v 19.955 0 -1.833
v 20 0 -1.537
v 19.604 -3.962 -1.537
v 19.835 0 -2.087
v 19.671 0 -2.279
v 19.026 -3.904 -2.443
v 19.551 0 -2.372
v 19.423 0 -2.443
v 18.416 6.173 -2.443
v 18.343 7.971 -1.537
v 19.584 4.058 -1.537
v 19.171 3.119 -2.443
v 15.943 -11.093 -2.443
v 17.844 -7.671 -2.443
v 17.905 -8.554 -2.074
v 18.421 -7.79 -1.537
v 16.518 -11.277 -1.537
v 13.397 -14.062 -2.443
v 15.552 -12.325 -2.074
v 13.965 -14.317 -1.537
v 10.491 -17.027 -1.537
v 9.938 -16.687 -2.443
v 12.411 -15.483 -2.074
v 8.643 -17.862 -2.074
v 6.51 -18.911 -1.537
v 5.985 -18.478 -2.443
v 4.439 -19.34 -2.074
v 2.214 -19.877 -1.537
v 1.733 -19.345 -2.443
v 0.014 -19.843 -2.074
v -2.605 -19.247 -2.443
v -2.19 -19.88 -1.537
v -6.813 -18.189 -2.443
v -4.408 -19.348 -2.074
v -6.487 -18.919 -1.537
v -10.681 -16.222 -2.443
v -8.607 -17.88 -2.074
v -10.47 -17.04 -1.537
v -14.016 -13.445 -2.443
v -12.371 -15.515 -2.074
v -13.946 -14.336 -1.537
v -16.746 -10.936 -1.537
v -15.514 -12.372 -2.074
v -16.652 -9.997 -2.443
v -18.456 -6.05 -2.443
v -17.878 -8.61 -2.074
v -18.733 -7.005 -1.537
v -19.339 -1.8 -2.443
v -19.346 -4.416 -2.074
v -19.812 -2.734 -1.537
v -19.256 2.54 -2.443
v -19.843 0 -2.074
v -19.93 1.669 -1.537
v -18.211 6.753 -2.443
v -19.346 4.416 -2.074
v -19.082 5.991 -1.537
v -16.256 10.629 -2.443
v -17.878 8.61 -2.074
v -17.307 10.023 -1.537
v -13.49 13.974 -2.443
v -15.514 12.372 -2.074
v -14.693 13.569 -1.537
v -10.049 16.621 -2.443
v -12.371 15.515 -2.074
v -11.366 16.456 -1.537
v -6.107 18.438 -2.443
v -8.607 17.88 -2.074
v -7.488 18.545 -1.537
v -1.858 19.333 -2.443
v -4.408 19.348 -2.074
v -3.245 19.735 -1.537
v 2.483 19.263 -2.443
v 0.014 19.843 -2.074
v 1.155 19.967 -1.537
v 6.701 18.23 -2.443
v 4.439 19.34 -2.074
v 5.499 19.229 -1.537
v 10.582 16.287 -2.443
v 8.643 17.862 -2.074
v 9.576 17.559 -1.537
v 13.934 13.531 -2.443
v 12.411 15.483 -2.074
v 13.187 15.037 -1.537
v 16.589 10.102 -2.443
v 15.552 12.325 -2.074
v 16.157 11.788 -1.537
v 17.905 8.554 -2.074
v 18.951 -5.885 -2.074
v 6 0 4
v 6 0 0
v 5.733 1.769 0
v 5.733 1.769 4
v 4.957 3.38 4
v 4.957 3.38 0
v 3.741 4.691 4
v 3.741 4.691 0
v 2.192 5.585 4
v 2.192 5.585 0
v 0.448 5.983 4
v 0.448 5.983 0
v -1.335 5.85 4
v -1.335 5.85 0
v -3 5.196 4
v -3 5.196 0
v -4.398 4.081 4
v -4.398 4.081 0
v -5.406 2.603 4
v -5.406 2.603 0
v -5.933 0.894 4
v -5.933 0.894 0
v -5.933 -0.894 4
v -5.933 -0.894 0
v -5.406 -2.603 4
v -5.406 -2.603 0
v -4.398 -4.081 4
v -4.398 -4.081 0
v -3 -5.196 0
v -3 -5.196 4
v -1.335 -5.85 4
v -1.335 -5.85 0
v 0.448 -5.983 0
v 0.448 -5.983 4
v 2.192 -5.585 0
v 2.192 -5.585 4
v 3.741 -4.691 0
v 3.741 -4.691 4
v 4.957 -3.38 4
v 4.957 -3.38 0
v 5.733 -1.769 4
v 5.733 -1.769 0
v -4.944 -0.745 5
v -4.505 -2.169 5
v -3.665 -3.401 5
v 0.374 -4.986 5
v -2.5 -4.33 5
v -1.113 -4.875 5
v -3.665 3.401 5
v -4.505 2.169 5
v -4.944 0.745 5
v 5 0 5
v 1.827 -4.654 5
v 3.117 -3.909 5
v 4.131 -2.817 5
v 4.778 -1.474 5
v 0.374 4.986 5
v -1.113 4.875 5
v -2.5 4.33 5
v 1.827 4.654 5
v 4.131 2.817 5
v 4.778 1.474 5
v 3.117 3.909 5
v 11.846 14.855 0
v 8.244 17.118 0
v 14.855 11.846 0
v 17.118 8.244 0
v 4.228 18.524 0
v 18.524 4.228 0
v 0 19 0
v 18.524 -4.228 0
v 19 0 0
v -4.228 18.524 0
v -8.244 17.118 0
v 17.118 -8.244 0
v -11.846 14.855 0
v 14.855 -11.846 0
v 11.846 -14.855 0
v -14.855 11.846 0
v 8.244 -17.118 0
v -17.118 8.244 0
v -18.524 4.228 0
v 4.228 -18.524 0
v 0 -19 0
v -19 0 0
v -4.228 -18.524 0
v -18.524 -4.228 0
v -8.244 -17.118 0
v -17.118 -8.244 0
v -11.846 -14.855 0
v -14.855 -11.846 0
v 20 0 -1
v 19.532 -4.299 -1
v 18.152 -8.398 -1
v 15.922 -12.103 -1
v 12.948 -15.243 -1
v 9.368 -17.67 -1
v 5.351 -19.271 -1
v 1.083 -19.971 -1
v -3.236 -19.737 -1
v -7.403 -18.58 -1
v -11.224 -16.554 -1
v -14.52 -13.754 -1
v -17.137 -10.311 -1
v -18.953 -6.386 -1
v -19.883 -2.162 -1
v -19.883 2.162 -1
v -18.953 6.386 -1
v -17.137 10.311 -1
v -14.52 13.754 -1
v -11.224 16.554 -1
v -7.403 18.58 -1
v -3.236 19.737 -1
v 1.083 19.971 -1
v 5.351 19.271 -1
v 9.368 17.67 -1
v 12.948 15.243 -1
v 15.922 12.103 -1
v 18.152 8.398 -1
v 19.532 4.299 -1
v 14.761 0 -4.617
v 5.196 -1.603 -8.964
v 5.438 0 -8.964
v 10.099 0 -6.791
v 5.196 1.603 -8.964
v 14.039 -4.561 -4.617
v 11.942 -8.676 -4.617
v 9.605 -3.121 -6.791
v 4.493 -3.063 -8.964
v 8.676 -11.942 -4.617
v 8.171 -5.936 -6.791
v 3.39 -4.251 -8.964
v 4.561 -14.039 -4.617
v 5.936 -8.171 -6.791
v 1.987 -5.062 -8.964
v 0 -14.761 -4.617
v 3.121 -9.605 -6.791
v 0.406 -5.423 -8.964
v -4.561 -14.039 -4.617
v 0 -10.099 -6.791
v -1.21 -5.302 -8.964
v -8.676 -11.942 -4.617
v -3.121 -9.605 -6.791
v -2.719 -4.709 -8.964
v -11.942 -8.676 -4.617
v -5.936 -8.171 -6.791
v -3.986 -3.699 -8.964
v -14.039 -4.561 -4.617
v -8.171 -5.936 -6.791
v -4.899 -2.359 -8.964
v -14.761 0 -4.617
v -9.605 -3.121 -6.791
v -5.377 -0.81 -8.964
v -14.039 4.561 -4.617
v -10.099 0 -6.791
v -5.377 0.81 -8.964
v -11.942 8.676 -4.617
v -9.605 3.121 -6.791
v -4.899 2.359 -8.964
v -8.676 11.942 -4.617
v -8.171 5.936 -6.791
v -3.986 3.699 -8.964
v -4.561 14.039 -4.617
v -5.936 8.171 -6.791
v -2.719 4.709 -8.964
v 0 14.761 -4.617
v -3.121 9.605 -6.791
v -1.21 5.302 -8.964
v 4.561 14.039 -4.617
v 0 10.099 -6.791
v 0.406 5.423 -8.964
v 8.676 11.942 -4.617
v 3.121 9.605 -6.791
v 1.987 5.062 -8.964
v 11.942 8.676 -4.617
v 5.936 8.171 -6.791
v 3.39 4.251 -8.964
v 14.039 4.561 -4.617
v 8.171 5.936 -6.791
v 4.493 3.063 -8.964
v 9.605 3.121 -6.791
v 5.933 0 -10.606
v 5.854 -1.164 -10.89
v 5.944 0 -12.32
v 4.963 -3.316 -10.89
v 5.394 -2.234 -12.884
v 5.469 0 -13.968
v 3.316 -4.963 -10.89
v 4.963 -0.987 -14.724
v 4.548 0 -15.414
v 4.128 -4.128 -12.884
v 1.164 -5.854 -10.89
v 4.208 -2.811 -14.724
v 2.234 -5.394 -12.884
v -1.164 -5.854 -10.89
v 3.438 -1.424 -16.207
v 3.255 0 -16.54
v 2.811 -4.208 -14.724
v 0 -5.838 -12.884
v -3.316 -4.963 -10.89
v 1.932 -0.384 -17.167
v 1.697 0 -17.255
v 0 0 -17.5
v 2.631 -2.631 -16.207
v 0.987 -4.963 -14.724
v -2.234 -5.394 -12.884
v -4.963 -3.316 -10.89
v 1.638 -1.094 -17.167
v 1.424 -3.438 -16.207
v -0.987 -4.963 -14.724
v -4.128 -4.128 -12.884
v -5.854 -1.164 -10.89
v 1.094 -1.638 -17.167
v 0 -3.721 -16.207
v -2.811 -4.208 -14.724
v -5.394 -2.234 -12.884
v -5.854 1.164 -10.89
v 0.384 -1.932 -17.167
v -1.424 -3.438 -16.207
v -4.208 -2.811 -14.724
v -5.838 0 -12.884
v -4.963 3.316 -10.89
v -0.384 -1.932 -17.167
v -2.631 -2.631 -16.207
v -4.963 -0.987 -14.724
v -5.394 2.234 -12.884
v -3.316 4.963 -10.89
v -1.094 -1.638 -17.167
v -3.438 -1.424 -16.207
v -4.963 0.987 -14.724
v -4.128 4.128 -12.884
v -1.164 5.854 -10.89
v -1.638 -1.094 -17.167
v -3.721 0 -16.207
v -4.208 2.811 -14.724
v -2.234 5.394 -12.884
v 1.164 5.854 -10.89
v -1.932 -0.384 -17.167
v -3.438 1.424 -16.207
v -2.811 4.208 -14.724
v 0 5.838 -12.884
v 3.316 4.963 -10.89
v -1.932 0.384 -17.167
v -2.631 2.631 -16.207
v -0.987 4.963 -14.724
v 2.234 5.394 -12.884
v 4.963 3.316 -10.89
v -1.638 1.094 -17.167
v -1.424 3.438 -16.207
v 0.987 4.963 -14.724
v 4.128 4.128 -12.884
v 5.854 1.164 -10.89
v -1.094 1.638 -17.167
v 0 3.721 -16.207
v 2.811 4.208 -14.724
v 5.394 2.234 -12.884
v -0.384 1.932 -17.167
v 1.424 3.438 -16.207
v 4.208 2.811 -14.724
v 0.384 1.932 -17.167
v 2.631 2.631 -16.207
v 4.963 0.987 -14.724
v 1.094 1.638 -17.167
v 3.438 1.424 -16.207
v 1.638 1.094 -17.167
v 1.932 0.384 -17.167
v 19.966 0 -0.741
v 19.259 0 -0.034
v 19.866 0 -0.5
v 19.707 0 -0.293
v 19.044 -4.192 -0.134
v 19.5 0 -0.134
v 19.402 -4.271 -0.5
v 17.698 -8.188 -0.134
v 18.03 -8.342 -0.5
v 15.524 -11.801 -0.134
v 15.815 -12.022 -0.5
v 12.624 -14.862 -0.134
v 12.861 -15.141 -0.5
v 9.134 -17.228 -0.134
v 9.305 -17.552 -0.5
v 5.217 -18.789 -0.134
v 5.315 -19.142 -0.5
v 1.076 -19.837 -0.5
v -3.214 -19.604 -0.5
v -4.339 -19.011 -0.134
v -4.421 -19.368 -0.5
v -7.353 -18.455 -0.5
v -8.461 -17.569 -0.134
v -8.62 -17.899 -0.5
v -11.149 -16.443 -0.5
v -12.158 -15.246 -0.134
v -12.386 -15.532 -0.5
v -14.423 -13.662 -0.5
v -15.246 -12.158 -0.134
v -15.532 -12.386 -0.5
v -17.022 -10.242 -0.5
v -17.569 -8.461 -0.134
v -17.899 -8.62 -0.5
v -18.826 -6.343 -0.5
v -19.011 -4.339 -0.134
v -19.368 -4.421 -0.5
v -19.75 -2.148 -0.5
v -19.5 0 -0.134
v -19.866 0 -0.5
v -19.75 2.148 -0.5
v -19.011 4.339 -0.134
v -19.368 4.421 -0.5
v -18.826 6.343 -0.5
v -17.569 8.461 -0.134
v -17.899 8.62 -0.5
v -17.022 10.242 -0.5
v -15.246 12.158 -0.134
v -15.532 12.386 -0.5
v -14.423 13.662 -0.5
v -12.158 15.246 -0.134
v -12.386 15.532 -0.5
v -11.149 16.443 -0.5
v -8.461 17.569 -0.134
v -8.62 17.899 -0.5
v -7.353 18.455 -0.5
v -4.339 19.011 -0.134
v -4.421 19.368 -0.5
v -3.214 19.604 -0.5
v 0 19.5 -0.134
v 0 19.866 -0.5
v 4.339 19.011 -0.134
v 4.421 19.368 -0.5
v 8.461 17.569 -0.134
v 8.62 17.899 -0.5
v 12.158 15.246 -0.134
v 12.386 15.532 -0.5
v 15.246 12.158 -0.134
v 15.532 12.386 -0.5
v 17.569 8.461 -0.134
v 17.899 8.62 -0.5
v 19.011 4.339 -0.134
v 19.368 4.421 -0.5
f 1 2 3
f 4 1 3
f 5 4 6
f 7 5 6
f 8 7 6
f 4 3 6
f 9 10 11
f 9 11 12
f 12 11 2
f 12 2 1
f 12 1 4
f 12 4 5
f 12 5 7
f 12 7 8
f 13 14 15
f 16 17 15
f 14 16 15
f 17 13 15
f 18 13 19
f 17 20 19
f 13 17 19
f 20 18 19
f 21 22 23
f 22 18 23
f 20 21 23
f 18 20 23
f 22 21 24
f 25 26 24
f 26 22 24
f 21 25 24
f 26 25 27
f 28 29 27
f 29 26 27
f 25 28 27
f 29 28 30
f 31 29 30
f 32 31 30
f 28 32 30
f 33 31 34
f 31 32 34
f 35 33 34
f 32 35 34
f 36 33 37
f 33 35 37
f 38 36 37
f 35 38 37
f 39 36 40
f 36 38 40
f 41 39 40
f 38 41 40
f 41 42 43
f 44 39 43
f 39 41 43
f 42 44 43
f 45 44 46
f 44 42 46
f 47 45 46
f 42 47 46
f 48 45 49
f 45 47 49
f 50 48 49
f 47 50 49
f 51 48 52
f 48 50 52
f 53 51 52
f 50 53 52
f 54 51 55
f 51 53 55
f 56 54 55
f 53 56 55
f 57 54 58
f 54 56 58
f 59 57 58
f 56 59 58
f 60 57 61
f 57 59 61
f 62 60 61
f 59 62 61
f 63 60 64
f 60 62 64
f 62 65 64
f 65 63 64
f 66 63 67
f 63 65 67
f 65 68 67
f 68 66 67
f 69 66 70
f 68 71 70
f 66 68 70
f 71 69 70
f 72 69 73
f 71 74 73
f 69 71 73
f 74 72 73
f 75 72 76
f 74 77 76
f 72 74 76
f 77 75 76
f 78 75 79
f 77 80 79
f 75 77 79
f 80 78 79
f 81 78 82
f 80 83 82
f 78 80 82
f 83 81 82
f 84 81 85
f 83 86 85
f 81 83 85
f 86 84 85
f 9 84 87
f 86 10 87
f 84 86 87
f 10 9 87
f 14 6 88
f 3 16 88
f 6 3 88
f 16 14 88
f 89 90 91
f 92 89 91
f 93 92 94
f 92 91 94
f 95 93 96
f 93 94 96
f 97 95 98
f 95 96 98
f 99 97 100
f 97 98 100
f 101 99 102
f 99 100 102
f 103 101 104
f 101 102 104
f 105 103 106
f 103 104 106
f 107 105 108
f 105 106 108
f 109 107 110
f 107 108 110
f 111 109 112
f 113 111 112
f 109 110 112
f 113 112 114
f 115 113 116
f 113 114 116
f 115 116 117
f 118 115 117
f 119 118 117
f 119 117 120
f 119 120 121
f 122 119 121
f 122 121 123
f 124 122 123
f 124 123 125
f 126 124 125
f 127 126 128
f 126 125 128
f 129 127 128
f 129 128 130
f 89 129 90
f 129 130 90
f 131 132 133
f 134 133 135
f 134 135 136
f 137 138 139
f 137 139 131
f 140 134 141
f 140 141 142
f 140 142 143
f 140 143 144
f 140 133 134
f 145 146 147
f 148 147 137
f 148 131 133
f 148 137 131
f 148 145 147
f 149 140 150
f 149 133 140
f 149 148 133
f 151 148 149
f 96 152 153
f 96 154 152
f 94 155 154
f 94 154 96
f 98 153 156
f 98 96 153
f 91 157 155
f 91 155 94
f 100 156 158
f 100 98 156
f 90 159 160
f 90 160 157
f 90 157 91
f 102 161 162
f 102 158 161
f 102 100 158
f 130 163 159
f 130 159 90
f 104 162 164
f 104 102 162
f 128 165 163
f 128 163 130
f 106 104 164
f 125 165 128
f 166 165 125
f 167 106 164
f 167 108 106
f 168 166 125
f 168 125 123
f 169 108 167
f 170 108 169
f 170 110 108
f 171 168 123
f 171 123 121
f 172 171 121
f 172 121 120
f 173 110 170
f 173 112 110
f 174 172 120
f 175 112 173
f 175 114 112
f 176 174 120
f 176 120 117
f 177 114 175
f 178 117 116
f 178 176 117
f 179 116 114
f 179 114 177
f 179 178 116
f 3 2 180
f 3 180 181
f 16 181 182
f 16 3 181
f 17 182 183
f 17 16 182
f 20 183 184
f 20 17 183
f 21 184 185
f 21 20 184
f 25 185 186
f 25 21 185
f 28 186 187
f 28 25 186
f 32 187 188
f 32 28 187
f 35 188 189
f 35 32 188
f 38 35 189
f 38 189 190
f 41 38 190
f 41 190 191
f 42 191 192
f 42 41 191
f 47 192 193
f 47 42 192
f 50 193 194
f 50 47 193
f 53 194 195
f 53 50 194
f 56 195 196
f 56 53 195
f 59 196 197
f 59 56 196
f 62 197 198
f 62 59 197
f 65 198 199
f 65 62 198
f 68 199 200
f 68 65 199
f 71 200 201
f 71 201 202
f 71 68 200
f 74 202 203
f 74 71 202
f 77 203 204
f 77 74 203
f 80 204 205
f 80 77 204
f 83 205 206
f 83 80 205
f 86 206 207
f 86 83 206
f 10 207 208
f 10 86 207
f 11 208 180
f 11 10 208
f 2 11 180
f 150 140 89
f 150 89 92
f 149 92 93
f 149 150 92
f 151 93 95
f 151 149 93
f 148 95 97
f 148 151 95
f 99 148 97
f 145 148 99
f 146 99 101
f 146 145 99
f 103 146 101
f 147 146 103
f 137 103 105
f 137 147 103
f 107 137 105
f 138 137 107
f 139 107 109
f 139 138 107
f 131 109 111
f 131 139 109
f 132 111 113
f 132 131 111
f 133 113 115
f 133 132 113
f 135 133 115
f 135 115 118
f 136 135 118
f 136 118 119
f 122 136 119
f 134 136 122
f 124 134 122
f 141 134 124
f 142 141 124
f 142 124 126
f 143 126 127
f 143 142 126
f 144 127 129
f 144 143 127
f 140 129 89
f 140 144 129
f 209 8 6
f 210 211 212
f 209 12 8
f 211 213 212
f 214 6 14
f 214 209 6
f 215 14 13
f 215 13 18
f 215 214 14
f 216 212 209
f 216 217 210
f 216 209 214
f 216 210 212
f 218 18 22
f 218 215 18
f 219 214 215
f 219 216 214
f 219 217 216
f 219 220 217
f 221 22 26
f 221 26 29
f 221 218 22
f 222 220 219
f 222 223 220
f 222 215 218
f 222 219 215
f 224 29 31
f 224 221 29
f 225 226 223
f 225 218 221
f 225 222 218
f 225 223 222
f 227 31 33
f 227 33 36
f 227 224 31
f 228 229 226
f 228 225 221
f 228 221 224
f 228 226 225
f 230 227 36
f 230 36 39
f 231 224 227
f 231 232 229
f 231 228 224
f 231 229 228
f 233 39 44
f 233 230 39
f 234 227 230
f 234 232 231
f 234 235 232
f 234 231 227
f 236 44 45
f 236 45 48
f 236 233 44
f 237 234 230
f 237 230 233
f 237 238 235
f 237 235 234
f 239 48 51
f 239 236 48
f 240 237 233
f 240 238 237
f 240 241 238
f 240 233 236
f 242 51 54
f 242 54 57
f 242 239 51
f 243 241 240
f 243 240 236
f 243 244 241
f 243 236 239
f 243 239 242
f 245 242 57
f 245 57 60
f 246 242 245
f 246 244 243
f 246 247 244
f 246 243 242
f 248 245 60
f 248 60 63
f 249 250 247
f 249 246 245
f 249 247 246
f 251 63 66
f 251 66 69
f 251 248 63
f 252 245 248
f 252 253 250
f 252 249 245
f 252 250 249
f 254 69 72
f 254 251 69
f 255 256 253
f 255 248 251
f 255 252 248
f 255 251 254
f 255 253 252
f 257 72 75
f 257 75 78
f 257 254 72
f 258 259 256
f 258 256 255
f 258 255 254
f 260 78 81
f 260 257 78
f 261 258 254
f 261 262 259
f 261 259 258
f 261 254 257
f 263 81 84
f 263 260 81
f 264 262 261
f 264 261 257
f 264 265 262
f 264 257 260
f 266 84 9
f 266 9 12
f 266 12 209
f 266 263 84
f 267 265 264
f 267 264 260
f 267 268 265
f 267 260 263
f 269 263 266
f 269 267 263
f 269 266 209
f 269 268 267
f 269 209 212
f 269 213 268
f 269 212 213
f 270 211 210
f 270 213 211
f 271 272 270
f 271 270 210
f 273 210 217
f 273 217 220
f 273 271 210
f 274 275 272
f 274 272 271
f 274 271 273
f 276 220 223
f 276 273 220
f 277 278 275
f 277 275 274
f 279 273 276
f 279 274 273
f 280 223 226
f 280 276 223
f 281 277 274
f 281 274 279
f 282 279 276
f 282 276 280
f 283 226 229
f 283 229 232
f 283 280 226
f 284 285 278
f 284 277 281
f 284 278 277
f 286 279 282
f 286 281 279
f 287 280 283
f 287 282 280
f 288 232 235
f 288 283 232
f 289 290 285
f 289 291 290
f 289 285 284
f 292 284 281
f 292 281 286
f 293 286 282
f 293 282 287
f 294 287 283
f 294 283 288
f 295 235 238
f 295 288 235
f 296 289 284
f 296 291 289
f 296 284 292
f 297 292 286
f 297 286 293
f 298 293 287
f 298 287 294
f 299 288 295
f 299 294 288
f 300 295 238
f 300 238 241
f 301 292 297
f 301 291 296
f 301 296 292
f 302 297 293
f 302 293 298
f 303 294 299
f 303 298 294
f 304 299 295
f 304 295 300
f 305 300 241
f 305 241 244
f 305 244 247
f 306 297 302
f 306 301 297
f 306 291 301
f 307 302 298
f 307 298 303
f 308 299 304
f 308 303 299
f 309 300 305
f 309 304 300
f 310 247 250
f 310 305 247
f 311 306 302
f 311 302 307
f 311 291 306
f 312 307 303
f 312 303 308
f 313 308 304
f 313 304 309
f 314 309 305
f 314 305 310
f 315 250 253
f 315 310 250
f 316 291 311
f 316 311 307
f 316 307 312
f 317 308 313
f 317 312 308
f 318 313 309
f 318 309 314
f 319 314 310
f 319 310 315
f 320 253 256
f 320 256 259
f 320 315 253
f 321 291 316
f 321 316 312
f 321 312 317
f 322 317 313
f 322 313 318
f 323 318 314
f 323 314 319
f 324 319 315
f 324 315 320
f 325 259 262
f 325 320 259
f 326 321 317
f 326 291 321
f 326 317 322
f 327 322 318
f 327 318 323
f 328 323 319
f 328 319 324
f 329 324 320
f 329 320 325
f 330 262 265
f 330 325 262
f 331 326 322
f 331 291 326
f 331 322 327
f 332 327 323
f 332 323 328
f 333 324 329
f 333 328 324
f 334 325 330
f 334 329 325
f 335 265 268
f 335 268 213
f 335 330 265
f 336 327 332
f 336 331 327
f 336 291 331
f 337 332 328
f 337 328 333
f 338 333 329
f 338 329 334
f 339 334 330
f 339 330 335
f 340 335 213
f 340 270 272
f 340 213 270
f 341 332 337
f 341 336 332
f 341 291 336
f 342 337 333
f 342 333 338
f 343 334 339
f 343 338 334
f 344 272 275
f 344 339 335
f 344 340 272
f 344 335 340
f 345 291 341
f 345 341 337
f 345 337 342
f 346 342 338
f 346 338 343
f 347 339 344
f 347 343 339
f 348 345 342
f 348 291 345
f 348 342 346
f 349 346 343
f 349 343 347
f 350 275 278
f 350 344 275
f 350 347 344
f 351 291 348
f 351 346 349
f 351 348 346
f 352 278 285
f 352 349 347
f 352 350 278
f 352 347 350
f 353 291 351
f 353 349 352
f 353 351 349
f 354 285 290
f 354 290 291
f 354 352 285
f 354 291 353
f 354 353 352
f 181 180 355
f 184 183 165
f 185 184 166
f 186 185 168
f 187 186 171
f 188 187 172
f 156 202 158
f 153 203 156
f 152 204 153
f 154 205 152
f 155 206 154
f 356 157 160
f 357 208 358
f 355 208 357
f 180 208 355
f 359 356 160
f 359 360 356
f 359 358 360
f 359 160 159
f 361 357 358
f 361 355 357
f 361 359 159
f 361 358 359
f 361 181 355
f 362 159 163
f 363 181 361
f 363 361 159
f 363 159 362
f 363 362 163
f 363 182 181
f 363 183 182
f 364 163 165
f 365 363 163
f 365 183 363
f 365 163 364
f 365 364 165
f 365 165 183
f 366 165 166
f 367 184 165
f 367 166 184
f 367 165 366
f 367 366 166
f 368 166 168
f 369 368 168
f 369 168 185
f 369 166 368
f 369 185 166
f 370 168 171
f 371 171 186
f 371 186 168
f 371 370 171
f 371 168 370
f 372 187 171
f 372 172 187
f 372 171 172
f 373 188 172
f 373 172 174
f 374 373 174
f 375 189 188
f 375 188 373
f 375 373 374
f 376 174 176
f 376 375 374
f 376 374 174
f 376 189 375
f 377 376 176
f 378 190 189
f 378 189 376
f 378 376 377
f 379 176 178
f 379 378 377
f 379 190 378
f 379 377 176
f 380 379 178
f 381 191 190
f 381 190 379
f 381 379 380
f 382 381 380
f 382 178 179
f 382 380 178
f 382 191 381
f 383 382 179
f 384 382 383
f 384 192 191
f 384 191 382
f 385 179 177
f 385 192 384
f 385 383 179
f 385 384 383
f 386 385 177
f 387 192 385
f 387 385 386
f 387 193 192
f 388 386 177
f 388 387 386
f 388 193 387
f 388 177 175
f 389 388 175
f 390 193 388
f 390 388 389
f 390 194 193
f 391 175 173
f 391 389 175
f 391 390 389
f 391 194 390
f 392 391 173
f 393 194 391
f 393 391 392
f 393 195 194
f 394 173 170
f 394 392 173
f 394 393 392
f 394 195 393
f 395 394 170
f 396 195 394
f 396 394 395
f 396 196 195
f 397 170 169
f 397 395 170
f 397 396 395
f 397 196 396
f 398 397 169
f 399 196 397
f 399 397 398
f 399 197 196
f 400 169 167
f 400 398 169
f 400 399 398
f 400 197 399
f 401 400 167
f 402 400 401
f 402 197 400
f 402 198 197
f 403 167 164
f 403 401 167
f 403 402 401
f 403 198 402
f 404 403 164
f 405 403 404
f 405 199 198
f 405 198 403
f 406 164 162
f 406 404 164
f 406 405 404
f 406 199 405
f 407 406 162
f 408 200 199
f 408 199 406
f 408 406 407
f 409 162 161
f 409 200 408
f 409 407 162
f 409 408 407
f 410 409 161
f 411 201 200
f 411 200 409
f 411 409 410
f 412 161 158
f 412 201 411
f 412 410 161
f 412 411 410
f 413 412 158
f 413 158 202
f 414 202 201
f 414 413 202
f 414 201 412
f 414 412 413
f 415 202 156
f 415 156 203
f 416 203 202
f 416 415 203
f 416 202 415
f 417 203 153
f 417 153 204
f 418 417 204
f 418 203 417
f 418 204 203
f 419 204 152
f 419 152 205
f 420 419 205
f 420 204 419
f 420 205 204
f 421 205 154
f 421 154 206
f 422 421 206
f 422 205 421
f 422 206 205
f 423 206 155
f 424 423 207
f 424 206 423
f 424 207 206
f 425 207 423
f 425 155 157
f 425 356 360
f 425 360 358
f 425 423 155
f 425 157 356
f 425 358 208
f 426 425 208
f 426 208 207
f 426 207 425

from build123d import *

# Parameters (mm, degrees)
SKETCH_1_R      = 6
EXTRUDE_1_DEPTH = 5
CHAMFER_1_SIZE  = 1
FILLET_1_R      = 1


with BuildPart() as part:
    # 草图1 → 凸台-拉伸1 (new body)
    with BuildSketch(Plane.XY):
        Circle(SKETCH_1_R)
    extrude(amount=EXTRUDE_1_DEPTH)

    # 草图2 → 旋转1 (revolve)
    with BuildSketch(Plane(origin=(0, 0, 0), x_dir=(0, 0, -1), z_dir=(1, 0, 0)), mode=Mode.PRIVATE) as revolve_1_sk:
        with BuildLine():
            Line((0, 0), (0, 20))
            Line((0, 20), (2.174, 20))
            Line((2.174, 20), (8.964324636, 5.437862673))
            ThreePointArc((8.964324636, 5.437862673), (14.723813566, 5.060338535), (17.5, 0))
            Line((17.5, 0), (0, 0))
        make_face()
    revolve(revolve_1_sk.sketch.rotate(Axis((0, 0, 0), (0, 0, -1)), 90), axis=Axis((0, 0, 0), (0, 0, -1)))

    # 倒角1
    chamfer_1_edges = [part.edges().sort_by_distance(p)[0] for p in [
        (-6, 0, 5),
    ]]
    chamfer(chamfer_1_edges, length=CHAMFER_1_SIZE)

    # 圆角1
    fillet_1_edges = [part.edges().sort_by_distance(p)[0] for p in [
        (-20, 0, -2.174),
        (-20, 0, 0),
    ]]
    fillet(fillet_1_edges, radius=FILLET_1_R)


solid = part.part
